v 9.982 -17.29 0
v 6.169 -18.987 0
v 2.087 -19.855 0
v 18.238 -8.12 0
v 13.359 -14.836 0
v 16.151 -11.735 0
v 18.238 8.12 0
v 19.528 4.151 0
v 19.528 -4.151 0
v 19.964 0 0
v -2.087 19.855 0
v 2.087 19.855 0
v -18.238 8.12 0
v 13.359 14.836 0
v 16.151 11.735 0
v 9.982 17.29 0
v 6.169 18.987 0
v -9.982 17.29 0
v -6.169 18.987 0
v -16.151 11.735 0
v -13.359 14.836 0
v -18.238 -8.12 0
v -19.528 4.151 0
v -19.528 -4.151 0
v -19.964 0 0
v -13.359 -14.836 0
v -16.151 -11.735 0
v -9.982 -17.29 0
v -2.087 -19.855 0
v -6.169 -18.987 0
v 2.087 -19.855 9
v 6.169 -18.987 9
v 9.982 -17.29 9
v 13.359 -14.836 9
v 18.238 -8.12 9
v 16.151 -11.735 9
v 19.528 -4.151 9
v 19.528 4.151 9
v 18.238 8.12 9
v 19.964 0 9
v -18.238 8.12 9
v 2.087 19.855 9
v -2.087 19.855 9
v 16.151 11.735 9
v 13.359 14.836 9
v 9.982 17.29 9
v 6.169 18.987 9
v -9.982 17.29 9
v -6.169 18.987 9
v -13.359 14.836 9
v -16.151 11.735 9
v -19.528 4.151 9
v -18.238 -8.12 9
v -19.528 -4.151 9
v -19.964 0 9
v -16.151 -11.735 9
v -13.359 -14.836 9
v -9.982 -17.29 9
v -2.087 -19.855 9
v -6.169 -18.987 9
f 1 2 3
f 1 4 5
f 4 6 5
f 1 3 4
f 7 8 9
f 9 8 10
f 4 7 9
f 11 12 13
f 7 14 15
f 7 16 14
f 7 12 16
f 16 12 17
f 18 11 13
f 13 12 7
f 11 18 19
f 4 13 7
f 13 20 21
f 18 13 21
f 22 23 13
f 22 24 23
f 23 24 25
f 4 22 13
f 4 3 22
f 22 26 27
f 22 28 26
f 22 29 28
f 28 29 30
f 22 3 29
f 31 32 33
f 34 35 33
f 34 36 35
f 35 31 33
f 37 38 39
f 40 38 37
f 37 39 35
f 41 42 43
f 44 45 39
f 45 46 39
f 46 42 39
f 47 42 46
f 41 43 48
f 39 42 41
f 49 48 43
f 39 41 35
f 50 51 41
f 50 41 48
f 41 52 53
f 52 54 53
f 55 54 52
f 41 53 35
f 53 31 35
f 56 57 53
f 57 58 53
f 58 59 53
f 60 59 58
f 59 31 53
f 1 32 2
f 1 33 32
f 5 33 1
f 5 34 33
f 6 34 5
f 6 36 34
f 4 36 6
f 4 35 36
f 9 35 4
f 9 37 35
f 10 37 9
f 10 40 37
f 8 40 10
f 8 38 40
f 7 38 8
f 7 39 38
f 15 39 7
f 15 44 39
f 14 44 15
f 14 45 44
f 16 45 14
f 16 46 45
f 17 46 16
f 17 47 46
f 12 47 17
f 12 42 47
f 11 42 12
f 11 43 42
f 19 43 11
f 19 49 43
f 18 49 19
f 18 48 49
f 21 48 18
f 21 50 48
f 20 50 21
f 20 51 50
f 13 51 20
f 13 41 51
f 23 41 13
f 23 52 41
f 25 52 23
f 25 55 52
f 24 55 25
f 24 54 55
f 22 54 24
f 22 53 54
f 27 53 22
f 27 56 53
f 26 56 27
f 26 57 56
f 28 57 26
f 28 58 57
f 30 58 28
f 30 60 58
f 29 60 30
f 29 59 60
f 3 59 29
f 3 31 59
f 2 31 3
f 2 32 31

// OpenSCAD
// Args are:
// num_cables - number of fiber optic cables
// zip_height - height of the ziplock
// zip_width - width of the ziplock
// cable_d - diameter of the cable
// bridge_err -- slack added to the bridge
// cable_err -- slack added for fitting cables inside the structure
// hug_angle -- angle at which each cable is hugged in degrees
module electree_weave_hugger(num_cables,
							zip_height,
							zip_width,
							cable_d,
							bridge_err,
                             cable_err,
							hug_angle) {
  bridge_width = 2 * zip_width + bridge_err;
  r_eff = cable_d/2 + zip_width;
  side_polygon = bridge_width + 2 * r_eff;
  // side_polygon = d * sin(hug_angle * pi/360);
  polygon_angle = 360/num_cables;
  substrate_circle_radius = side_polygon * sqrt(1/(2 - 2 * cos(polygon_angle)));
  //intersection() {
  //  translate([1,1,0]) scale([1.0, 2.0]) circle(cable_d + 2 * zip_width);
  //  scale([1.0, 2.0]) circle(cable_d + zip_width);
  //}
  //difference() {
  //  circle(substrate_circle_radius);
  //  translate([10,0,0]) circle(cable_d);
  //}
  //polygon(points = [[0,0],[100,0],[0,100]], paths = [[0,1,2]]);
  //circle(substrate_circle_radius);
  //circle(substrate_circle_radius);
  for (i = [1 : num_cables]) {
    rotate([0,0,360/num_cables*i])
    translate([substrate_circle_radius,0,0])
    %circle(cable_d/2);
  }
  difference() {
    circle(substrate_circle_radius);
    for (i = [1 : num_cables]) {
      difference() {
        rotate([0,0,360/num_cables*i])
          translate([substrate_circle_radius,0,0])
          scale([1.2,1.1,1])
          %circle(cable_d/2 + zip_width);
        rotate([0,0,360/num_cables*i])
          translate([substrate_circle_radius,0,0])
          scale([1.2,1,1])
          %circle(cable_d/2);
      }
    }    
  }
}

module cable_channel() {
}

linear_extrude(height=9) electree_weave_hugger(8, 4.572, 1.32, 9, 1, 0, 120);
